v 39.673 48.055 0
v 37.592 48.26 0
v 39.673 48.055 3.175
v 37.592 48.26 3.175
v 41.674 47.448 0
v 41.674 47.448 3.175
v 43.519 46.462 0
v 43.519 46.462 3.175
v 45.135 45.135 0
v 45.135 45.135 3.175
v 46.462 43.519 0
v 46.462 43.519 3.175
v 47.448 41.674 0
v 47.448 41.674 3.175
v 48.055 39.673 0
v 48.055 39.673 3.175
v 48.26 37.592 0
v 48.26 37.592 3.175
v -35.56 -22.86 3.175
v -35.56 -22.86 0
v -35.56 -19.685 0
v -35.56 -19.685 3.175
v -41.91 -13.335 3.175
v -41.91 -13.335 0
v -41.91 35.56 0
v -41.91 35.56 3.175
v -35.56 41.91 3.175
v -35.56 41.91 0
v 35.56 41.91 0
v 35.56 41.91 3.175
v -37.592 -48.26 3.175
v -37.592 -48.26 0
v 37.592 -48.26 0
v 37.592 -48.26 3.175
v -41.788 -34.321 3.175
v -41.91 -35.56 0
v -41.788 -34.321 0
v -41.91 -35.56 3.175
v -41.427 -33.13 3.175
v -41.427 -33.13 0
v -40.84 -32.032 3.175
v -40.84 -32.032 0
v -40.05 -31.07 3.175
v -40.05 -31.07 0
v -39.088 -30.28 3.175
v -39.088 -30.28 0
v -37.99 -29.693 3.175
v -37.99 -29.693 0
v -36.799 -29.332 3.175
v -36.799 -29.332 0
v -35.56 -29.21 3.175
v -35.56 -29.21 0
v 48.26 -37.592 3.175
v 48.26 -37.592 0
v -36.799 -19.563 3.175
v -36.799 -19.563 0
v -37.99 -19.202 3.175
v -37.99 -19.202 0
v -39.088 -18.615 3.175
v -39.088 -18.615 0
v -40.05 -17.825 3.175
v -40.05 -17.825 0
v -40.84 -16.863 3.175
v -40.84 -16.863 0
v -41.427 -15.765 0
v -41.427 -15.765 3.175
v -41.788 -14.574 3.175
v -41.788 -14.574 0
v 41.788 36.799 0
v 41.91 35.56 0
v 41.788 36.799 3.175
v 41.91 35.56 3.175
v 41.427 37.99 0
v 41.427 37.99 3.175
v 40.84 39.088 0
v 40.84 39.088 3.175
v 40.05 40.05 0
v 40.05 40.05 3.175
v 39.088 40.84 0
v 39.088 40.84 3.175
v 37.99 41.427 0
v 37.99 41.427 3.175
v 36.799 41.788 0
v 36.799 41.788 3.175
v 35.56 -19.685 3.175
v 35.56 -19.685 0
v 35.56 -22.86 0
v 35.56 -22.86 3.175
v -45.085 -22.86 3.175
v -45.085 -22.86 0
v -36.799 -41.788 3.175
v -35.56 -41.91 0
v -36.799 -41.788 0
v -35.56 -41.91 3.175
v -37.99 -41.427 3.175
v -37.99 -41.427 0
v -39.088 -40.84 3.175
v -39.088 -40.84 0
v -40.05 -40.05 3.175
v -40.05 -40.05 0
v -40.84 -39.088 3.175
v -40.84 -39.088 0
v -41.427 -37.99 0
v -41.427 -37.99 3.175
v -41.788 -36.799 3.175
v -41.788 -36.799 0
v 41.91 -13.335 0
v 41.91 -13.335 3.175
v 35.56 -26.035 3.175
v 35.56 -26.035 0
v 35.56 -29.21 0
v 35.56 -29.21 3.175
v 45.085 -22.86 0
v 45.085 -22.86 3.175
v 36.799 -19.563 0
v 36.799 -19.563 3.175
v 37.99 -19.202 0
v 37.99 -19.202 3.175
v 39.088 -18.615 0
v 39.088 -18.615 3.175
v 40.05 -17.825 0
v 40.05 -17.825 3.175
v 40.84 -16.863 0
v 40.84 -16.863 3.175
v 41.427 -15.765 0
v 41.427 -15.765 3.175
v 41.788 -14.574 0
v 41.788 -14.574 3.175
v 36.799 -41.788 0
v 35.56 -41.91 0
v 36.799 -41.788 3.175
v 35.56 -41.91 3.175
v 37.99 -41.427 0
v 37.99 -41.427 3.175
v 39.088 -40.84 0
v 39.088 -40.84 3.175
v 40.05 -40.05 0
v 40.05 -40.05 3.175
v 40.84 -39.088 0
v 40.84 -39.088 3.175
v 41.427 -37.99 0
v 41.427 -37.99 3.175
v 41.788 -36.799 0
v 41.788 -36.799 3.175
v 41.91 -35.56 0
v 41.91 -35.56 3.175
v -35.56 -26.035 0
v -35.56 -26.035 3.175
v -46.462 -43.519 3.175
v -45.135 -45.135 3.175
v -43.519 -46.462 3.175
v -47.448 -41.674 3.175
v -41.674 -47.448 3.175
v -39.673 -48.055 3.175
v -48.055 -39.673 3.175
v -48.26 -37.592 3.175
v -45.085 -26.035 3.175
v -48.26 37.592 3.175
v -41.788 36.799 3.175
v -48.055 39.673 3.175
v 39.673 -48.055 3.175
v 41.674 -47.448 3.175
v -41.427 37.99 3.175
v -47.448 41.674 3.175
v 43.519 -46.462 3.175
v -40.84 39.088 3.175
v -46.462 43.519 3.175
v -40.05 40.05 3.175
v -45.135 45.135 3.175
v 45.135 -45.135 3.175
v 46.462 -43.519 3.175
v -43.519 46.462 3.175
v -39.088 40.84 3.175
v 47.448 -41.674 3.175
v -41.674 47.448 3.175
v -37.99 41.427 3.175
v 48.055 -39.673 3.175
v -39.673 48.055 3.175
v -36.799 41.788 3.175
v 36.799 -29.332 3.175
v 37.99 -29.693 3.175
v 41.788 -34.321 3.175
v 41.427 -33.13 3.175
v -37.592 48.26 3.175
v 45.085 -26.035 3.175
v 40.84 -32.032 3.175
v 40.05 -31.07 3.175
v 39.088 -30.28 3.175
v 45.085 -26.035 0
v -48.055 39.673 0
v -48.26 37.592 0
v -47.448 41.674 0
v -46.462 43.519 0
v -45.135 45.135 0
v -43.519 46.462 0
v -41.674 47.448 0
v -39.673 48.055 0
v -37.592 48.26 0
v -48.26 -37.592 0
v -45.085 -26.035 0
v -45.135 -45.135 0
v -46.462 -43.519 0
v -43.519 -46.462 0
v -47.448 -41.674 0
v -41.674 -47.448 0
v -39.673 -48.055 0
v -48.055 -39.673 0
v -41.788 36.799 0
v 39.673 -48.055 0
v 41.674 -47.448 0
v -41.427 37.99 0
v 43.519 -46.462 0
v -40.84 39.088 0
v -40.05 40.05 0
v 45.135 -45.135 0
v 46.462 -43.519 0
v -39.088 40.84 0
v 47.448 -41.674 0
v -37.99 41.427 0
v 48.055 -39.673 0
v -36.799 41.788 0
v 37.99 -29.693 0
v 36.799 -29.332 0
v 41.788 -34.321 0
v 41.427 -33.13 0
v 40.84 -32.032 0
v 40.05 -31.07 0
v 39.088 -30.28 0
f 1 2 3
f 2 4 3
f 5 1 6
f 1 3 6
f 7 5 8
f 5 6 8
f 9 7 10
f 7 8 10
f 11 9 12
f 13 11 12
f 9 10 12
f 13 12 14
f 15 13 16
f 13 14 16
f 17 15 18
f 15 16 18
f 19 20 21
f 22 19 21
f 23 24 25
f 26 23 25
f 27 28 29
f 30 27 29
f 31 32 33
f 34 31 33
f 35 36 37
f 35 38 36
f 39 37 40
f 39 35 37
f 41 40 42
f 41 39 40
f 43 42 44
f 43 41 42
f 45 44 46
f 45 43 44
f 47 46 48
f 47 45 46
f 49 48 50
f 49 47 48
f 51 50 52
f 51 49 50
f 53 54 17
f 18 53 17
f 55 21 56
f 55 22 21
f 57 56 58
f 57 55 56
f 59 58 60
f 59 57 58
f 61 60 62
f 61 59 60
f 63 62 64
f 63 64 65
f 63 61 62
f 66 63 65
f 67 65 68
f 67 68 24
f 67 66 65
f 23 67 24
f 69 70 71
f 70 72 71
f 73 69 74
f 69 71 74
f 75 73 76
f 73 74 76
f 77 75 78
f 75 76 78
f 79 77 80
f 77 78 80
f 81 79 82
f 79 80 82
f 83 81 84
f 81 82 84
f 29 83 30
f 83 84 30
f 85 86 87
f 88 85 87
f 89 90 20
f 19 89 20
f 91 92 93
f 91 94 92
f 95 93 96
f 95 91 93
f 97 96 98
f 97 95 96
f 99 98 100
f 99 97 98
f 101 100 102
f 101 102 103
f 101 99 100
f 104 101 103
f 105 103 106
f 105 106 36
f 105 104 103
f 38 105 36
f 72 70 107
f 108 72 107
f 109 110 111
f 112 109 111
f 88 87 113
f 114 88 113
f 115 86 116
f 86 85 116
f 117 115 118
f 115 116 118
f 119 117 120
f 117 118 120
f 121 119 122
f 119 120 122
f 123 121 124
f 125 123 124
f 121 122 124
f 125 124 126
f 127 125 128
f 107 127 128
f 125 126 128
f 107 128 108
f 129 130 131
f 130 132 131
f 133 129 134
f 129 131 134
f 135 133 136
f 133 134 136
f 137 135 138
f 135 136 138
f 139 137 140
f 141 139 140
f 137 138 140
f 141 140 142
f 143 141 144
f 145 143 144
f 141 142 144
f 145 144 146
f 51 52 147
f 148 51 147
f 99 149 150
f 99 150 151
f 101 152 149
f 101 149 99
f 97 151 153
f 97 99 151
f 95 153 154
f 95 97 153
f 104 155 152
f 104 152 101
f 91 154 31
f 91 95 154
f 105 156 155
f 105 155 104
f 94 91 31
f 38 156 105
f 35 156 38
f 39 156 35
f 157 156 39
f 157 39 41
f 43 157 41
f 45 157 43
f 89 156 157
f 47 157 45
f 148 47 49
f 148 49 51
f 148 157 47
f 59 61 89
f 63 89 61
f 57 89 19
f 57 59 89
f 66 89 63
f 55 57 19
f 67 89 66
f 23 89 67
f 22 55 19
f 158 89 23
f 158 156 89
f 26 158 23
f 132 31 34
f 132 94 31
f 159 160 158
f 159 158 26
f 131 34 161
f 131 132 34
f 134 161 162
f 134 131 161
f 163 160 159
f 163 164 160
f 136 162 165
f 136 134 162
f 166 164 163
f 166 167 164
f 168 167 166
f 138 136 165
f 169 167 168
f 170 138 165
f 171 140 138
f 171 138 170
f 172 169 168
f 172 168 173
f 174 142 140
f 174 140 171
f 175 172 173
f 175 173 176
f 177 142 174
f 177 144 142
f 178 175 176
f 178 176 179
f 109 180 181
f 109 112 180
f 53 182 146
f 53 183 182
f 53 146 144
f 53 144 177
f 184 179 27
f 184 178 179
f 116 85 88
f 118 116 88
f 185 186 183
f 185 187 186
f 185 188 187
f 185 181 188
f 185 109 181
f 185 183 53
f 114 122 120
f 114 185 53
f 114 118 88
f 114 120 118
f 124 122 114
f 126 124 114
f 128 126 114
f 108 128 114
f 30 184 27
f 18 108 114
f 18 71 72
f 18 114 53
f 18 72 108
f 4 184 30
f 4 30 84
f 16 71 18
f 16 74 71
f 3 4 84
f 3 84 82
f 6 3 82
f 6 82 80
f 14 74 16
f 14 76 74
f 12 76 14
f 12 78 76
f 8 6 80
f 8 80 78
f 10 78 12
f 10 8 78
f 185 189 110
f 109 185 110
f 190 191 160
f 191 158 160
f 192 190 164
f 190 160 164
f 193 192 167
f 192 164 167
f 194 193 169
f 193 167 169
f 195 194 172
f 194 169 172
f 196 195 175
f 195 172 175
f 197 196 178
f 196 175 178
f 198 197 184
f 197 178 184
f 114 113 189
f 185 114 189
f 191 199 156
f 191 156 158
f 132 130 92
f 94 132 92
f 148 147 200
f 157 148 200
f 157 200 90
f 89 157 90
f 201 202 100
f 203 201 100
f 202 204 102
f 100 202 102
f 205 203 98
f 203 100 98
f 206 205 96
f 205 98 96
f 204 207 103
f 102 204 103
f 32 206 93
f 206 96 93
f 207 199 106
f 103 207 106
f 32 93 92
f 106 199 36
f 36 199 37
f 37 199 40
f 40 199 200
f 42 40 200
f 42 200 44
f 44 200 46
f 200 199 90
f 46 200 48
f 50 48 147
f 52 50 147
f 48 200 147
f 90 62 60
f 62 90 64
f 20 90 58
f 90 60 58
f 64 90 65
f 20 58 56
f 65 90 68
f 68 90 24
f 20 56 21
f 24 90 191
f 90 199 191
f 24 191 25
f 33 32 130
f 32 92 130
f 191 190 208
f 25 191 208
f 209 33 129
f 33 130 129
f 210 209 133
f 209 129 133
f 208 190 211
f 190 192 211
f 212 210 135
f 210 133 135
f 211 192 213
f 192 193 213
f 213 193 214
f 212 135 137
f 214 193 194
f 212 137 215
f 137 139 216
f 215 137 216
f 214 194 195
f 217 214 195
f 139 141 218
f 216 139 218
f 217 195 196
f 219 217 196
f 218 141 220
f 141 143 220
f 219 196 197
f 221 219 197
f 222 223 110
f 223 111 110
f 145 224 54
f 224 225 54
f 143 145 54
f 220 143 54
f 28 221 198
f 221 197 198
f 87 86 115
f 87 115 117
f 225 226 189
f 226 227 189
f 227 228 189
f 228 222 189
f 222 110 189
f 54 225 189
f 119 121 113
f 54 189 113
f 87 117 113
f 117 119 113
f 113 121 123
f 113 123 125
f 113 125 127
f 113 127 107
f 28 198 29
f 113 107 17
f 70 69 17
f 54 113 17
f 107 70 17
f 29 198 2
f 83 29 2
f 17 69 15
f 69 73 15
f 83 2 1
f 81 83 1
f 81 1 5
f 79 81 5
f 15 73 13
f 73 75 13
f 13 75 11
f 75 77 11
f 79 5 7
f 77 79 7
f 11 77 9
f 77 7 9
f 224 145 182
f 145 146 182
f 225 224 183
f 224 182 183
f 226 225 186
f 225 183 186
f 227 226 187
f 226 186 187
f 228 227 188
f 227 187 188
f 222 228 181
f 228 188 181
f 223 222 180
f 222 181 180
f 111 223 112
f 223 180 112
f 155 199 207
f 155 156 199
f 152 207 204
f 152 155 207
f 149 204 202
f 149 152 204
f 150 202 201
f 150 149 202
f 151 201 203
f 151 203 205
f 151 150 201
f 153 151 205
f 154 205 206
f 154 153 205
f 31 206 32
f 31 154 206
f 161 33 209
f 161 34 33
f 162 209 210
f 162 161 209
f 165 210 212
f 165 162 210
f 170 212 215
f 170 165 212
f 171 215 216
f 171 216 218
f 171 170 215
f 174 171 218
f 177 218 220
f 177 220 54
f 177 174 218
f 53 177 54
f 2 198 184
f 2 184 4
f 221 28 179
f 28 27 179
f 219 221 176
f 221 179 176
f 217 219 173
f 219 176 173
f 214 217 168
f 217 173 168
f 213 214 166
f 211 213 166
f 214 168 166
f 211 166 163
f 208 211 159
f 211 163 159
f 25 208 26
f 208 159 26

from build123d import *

# Parameters (mm, degrees)
SKETCH1_W           = 96.52
SKETCH1_H           = 96.52
BOSS_EXTRUDE1_DEPTH = 3.175
FILLET1_R           = 10.668
FILLET2_R           = 6.35
FILLET3_R           = 6.35


with BuildPart() as part:
    # Sketch1 → Boss-Extrude1 (new body)
    with BuildSketch(Plane.XY):
        Rectangle(SKETCH1_W, SKETCH1_H)
        Polygon((-41.91, -41.91), (-41.91, -29.21), (-35.56, -29.21), (-35.56, -26.035), (-45.085, -26.035), (-45.085, -22.86), (-35.56, -22.86), (-35.56, -19.685), (-41.91, -19.685), (-41.91, 41.91), (41.91, 41.91), (41.91, -19.685), (35.56, -19.685), (35.56, -22.86), (45.085, -22.86), (45.085, -26.035), (35.56, -26.035), (35.56, -29.21), (41.91, -29.21), (41.91, -41.91), align=None, mode=Mode.SUBTRACT)
    extrude(amount=BOSS_EXTRUDE1_DEPTH)

    # Fillet1
    fillet1_edges = [part.edges().sort_by_distance(p)[0] for p in [
        (48.26, -48.26, 1.5875),
        (-48.26, -48.26, 1.5875),
        (-48.26, 48.26, 1.5875),
        (48.26, 48.26, 1.5875),
    ]]
    fillet(fillet1_edges, radius=FILLET1_R)

    # Fillet2
    fillet2_edges = [part.edges().sort_by_distance(p)[0] for p in [
        (-41.91, -41.91, 1.5875),
        (41.91, -41.91, 1.5875),
        (41.91, 41.91, 1.5875),
        (-41.91, 41.91, 1.5875),
    ]]
    fillet(fillet2_edges, radius=FILLET2_R)

    # Fillet3
    fillet3_edges = [part.edges().sort_by_distance(p)[0] for p in [
        (41.91, -29.21, 1.5875),
        (41.91, -19.685, 1.5875),
        (-41.91, -19.685, 1.5875),
        (-41.91, -29.21, 1.5875),
    ]]
    fillet(fillet3_edges, radius=FILLET3_R - 0.0001)  # a hair under: the kernel refuses the full size


solid = part.part
